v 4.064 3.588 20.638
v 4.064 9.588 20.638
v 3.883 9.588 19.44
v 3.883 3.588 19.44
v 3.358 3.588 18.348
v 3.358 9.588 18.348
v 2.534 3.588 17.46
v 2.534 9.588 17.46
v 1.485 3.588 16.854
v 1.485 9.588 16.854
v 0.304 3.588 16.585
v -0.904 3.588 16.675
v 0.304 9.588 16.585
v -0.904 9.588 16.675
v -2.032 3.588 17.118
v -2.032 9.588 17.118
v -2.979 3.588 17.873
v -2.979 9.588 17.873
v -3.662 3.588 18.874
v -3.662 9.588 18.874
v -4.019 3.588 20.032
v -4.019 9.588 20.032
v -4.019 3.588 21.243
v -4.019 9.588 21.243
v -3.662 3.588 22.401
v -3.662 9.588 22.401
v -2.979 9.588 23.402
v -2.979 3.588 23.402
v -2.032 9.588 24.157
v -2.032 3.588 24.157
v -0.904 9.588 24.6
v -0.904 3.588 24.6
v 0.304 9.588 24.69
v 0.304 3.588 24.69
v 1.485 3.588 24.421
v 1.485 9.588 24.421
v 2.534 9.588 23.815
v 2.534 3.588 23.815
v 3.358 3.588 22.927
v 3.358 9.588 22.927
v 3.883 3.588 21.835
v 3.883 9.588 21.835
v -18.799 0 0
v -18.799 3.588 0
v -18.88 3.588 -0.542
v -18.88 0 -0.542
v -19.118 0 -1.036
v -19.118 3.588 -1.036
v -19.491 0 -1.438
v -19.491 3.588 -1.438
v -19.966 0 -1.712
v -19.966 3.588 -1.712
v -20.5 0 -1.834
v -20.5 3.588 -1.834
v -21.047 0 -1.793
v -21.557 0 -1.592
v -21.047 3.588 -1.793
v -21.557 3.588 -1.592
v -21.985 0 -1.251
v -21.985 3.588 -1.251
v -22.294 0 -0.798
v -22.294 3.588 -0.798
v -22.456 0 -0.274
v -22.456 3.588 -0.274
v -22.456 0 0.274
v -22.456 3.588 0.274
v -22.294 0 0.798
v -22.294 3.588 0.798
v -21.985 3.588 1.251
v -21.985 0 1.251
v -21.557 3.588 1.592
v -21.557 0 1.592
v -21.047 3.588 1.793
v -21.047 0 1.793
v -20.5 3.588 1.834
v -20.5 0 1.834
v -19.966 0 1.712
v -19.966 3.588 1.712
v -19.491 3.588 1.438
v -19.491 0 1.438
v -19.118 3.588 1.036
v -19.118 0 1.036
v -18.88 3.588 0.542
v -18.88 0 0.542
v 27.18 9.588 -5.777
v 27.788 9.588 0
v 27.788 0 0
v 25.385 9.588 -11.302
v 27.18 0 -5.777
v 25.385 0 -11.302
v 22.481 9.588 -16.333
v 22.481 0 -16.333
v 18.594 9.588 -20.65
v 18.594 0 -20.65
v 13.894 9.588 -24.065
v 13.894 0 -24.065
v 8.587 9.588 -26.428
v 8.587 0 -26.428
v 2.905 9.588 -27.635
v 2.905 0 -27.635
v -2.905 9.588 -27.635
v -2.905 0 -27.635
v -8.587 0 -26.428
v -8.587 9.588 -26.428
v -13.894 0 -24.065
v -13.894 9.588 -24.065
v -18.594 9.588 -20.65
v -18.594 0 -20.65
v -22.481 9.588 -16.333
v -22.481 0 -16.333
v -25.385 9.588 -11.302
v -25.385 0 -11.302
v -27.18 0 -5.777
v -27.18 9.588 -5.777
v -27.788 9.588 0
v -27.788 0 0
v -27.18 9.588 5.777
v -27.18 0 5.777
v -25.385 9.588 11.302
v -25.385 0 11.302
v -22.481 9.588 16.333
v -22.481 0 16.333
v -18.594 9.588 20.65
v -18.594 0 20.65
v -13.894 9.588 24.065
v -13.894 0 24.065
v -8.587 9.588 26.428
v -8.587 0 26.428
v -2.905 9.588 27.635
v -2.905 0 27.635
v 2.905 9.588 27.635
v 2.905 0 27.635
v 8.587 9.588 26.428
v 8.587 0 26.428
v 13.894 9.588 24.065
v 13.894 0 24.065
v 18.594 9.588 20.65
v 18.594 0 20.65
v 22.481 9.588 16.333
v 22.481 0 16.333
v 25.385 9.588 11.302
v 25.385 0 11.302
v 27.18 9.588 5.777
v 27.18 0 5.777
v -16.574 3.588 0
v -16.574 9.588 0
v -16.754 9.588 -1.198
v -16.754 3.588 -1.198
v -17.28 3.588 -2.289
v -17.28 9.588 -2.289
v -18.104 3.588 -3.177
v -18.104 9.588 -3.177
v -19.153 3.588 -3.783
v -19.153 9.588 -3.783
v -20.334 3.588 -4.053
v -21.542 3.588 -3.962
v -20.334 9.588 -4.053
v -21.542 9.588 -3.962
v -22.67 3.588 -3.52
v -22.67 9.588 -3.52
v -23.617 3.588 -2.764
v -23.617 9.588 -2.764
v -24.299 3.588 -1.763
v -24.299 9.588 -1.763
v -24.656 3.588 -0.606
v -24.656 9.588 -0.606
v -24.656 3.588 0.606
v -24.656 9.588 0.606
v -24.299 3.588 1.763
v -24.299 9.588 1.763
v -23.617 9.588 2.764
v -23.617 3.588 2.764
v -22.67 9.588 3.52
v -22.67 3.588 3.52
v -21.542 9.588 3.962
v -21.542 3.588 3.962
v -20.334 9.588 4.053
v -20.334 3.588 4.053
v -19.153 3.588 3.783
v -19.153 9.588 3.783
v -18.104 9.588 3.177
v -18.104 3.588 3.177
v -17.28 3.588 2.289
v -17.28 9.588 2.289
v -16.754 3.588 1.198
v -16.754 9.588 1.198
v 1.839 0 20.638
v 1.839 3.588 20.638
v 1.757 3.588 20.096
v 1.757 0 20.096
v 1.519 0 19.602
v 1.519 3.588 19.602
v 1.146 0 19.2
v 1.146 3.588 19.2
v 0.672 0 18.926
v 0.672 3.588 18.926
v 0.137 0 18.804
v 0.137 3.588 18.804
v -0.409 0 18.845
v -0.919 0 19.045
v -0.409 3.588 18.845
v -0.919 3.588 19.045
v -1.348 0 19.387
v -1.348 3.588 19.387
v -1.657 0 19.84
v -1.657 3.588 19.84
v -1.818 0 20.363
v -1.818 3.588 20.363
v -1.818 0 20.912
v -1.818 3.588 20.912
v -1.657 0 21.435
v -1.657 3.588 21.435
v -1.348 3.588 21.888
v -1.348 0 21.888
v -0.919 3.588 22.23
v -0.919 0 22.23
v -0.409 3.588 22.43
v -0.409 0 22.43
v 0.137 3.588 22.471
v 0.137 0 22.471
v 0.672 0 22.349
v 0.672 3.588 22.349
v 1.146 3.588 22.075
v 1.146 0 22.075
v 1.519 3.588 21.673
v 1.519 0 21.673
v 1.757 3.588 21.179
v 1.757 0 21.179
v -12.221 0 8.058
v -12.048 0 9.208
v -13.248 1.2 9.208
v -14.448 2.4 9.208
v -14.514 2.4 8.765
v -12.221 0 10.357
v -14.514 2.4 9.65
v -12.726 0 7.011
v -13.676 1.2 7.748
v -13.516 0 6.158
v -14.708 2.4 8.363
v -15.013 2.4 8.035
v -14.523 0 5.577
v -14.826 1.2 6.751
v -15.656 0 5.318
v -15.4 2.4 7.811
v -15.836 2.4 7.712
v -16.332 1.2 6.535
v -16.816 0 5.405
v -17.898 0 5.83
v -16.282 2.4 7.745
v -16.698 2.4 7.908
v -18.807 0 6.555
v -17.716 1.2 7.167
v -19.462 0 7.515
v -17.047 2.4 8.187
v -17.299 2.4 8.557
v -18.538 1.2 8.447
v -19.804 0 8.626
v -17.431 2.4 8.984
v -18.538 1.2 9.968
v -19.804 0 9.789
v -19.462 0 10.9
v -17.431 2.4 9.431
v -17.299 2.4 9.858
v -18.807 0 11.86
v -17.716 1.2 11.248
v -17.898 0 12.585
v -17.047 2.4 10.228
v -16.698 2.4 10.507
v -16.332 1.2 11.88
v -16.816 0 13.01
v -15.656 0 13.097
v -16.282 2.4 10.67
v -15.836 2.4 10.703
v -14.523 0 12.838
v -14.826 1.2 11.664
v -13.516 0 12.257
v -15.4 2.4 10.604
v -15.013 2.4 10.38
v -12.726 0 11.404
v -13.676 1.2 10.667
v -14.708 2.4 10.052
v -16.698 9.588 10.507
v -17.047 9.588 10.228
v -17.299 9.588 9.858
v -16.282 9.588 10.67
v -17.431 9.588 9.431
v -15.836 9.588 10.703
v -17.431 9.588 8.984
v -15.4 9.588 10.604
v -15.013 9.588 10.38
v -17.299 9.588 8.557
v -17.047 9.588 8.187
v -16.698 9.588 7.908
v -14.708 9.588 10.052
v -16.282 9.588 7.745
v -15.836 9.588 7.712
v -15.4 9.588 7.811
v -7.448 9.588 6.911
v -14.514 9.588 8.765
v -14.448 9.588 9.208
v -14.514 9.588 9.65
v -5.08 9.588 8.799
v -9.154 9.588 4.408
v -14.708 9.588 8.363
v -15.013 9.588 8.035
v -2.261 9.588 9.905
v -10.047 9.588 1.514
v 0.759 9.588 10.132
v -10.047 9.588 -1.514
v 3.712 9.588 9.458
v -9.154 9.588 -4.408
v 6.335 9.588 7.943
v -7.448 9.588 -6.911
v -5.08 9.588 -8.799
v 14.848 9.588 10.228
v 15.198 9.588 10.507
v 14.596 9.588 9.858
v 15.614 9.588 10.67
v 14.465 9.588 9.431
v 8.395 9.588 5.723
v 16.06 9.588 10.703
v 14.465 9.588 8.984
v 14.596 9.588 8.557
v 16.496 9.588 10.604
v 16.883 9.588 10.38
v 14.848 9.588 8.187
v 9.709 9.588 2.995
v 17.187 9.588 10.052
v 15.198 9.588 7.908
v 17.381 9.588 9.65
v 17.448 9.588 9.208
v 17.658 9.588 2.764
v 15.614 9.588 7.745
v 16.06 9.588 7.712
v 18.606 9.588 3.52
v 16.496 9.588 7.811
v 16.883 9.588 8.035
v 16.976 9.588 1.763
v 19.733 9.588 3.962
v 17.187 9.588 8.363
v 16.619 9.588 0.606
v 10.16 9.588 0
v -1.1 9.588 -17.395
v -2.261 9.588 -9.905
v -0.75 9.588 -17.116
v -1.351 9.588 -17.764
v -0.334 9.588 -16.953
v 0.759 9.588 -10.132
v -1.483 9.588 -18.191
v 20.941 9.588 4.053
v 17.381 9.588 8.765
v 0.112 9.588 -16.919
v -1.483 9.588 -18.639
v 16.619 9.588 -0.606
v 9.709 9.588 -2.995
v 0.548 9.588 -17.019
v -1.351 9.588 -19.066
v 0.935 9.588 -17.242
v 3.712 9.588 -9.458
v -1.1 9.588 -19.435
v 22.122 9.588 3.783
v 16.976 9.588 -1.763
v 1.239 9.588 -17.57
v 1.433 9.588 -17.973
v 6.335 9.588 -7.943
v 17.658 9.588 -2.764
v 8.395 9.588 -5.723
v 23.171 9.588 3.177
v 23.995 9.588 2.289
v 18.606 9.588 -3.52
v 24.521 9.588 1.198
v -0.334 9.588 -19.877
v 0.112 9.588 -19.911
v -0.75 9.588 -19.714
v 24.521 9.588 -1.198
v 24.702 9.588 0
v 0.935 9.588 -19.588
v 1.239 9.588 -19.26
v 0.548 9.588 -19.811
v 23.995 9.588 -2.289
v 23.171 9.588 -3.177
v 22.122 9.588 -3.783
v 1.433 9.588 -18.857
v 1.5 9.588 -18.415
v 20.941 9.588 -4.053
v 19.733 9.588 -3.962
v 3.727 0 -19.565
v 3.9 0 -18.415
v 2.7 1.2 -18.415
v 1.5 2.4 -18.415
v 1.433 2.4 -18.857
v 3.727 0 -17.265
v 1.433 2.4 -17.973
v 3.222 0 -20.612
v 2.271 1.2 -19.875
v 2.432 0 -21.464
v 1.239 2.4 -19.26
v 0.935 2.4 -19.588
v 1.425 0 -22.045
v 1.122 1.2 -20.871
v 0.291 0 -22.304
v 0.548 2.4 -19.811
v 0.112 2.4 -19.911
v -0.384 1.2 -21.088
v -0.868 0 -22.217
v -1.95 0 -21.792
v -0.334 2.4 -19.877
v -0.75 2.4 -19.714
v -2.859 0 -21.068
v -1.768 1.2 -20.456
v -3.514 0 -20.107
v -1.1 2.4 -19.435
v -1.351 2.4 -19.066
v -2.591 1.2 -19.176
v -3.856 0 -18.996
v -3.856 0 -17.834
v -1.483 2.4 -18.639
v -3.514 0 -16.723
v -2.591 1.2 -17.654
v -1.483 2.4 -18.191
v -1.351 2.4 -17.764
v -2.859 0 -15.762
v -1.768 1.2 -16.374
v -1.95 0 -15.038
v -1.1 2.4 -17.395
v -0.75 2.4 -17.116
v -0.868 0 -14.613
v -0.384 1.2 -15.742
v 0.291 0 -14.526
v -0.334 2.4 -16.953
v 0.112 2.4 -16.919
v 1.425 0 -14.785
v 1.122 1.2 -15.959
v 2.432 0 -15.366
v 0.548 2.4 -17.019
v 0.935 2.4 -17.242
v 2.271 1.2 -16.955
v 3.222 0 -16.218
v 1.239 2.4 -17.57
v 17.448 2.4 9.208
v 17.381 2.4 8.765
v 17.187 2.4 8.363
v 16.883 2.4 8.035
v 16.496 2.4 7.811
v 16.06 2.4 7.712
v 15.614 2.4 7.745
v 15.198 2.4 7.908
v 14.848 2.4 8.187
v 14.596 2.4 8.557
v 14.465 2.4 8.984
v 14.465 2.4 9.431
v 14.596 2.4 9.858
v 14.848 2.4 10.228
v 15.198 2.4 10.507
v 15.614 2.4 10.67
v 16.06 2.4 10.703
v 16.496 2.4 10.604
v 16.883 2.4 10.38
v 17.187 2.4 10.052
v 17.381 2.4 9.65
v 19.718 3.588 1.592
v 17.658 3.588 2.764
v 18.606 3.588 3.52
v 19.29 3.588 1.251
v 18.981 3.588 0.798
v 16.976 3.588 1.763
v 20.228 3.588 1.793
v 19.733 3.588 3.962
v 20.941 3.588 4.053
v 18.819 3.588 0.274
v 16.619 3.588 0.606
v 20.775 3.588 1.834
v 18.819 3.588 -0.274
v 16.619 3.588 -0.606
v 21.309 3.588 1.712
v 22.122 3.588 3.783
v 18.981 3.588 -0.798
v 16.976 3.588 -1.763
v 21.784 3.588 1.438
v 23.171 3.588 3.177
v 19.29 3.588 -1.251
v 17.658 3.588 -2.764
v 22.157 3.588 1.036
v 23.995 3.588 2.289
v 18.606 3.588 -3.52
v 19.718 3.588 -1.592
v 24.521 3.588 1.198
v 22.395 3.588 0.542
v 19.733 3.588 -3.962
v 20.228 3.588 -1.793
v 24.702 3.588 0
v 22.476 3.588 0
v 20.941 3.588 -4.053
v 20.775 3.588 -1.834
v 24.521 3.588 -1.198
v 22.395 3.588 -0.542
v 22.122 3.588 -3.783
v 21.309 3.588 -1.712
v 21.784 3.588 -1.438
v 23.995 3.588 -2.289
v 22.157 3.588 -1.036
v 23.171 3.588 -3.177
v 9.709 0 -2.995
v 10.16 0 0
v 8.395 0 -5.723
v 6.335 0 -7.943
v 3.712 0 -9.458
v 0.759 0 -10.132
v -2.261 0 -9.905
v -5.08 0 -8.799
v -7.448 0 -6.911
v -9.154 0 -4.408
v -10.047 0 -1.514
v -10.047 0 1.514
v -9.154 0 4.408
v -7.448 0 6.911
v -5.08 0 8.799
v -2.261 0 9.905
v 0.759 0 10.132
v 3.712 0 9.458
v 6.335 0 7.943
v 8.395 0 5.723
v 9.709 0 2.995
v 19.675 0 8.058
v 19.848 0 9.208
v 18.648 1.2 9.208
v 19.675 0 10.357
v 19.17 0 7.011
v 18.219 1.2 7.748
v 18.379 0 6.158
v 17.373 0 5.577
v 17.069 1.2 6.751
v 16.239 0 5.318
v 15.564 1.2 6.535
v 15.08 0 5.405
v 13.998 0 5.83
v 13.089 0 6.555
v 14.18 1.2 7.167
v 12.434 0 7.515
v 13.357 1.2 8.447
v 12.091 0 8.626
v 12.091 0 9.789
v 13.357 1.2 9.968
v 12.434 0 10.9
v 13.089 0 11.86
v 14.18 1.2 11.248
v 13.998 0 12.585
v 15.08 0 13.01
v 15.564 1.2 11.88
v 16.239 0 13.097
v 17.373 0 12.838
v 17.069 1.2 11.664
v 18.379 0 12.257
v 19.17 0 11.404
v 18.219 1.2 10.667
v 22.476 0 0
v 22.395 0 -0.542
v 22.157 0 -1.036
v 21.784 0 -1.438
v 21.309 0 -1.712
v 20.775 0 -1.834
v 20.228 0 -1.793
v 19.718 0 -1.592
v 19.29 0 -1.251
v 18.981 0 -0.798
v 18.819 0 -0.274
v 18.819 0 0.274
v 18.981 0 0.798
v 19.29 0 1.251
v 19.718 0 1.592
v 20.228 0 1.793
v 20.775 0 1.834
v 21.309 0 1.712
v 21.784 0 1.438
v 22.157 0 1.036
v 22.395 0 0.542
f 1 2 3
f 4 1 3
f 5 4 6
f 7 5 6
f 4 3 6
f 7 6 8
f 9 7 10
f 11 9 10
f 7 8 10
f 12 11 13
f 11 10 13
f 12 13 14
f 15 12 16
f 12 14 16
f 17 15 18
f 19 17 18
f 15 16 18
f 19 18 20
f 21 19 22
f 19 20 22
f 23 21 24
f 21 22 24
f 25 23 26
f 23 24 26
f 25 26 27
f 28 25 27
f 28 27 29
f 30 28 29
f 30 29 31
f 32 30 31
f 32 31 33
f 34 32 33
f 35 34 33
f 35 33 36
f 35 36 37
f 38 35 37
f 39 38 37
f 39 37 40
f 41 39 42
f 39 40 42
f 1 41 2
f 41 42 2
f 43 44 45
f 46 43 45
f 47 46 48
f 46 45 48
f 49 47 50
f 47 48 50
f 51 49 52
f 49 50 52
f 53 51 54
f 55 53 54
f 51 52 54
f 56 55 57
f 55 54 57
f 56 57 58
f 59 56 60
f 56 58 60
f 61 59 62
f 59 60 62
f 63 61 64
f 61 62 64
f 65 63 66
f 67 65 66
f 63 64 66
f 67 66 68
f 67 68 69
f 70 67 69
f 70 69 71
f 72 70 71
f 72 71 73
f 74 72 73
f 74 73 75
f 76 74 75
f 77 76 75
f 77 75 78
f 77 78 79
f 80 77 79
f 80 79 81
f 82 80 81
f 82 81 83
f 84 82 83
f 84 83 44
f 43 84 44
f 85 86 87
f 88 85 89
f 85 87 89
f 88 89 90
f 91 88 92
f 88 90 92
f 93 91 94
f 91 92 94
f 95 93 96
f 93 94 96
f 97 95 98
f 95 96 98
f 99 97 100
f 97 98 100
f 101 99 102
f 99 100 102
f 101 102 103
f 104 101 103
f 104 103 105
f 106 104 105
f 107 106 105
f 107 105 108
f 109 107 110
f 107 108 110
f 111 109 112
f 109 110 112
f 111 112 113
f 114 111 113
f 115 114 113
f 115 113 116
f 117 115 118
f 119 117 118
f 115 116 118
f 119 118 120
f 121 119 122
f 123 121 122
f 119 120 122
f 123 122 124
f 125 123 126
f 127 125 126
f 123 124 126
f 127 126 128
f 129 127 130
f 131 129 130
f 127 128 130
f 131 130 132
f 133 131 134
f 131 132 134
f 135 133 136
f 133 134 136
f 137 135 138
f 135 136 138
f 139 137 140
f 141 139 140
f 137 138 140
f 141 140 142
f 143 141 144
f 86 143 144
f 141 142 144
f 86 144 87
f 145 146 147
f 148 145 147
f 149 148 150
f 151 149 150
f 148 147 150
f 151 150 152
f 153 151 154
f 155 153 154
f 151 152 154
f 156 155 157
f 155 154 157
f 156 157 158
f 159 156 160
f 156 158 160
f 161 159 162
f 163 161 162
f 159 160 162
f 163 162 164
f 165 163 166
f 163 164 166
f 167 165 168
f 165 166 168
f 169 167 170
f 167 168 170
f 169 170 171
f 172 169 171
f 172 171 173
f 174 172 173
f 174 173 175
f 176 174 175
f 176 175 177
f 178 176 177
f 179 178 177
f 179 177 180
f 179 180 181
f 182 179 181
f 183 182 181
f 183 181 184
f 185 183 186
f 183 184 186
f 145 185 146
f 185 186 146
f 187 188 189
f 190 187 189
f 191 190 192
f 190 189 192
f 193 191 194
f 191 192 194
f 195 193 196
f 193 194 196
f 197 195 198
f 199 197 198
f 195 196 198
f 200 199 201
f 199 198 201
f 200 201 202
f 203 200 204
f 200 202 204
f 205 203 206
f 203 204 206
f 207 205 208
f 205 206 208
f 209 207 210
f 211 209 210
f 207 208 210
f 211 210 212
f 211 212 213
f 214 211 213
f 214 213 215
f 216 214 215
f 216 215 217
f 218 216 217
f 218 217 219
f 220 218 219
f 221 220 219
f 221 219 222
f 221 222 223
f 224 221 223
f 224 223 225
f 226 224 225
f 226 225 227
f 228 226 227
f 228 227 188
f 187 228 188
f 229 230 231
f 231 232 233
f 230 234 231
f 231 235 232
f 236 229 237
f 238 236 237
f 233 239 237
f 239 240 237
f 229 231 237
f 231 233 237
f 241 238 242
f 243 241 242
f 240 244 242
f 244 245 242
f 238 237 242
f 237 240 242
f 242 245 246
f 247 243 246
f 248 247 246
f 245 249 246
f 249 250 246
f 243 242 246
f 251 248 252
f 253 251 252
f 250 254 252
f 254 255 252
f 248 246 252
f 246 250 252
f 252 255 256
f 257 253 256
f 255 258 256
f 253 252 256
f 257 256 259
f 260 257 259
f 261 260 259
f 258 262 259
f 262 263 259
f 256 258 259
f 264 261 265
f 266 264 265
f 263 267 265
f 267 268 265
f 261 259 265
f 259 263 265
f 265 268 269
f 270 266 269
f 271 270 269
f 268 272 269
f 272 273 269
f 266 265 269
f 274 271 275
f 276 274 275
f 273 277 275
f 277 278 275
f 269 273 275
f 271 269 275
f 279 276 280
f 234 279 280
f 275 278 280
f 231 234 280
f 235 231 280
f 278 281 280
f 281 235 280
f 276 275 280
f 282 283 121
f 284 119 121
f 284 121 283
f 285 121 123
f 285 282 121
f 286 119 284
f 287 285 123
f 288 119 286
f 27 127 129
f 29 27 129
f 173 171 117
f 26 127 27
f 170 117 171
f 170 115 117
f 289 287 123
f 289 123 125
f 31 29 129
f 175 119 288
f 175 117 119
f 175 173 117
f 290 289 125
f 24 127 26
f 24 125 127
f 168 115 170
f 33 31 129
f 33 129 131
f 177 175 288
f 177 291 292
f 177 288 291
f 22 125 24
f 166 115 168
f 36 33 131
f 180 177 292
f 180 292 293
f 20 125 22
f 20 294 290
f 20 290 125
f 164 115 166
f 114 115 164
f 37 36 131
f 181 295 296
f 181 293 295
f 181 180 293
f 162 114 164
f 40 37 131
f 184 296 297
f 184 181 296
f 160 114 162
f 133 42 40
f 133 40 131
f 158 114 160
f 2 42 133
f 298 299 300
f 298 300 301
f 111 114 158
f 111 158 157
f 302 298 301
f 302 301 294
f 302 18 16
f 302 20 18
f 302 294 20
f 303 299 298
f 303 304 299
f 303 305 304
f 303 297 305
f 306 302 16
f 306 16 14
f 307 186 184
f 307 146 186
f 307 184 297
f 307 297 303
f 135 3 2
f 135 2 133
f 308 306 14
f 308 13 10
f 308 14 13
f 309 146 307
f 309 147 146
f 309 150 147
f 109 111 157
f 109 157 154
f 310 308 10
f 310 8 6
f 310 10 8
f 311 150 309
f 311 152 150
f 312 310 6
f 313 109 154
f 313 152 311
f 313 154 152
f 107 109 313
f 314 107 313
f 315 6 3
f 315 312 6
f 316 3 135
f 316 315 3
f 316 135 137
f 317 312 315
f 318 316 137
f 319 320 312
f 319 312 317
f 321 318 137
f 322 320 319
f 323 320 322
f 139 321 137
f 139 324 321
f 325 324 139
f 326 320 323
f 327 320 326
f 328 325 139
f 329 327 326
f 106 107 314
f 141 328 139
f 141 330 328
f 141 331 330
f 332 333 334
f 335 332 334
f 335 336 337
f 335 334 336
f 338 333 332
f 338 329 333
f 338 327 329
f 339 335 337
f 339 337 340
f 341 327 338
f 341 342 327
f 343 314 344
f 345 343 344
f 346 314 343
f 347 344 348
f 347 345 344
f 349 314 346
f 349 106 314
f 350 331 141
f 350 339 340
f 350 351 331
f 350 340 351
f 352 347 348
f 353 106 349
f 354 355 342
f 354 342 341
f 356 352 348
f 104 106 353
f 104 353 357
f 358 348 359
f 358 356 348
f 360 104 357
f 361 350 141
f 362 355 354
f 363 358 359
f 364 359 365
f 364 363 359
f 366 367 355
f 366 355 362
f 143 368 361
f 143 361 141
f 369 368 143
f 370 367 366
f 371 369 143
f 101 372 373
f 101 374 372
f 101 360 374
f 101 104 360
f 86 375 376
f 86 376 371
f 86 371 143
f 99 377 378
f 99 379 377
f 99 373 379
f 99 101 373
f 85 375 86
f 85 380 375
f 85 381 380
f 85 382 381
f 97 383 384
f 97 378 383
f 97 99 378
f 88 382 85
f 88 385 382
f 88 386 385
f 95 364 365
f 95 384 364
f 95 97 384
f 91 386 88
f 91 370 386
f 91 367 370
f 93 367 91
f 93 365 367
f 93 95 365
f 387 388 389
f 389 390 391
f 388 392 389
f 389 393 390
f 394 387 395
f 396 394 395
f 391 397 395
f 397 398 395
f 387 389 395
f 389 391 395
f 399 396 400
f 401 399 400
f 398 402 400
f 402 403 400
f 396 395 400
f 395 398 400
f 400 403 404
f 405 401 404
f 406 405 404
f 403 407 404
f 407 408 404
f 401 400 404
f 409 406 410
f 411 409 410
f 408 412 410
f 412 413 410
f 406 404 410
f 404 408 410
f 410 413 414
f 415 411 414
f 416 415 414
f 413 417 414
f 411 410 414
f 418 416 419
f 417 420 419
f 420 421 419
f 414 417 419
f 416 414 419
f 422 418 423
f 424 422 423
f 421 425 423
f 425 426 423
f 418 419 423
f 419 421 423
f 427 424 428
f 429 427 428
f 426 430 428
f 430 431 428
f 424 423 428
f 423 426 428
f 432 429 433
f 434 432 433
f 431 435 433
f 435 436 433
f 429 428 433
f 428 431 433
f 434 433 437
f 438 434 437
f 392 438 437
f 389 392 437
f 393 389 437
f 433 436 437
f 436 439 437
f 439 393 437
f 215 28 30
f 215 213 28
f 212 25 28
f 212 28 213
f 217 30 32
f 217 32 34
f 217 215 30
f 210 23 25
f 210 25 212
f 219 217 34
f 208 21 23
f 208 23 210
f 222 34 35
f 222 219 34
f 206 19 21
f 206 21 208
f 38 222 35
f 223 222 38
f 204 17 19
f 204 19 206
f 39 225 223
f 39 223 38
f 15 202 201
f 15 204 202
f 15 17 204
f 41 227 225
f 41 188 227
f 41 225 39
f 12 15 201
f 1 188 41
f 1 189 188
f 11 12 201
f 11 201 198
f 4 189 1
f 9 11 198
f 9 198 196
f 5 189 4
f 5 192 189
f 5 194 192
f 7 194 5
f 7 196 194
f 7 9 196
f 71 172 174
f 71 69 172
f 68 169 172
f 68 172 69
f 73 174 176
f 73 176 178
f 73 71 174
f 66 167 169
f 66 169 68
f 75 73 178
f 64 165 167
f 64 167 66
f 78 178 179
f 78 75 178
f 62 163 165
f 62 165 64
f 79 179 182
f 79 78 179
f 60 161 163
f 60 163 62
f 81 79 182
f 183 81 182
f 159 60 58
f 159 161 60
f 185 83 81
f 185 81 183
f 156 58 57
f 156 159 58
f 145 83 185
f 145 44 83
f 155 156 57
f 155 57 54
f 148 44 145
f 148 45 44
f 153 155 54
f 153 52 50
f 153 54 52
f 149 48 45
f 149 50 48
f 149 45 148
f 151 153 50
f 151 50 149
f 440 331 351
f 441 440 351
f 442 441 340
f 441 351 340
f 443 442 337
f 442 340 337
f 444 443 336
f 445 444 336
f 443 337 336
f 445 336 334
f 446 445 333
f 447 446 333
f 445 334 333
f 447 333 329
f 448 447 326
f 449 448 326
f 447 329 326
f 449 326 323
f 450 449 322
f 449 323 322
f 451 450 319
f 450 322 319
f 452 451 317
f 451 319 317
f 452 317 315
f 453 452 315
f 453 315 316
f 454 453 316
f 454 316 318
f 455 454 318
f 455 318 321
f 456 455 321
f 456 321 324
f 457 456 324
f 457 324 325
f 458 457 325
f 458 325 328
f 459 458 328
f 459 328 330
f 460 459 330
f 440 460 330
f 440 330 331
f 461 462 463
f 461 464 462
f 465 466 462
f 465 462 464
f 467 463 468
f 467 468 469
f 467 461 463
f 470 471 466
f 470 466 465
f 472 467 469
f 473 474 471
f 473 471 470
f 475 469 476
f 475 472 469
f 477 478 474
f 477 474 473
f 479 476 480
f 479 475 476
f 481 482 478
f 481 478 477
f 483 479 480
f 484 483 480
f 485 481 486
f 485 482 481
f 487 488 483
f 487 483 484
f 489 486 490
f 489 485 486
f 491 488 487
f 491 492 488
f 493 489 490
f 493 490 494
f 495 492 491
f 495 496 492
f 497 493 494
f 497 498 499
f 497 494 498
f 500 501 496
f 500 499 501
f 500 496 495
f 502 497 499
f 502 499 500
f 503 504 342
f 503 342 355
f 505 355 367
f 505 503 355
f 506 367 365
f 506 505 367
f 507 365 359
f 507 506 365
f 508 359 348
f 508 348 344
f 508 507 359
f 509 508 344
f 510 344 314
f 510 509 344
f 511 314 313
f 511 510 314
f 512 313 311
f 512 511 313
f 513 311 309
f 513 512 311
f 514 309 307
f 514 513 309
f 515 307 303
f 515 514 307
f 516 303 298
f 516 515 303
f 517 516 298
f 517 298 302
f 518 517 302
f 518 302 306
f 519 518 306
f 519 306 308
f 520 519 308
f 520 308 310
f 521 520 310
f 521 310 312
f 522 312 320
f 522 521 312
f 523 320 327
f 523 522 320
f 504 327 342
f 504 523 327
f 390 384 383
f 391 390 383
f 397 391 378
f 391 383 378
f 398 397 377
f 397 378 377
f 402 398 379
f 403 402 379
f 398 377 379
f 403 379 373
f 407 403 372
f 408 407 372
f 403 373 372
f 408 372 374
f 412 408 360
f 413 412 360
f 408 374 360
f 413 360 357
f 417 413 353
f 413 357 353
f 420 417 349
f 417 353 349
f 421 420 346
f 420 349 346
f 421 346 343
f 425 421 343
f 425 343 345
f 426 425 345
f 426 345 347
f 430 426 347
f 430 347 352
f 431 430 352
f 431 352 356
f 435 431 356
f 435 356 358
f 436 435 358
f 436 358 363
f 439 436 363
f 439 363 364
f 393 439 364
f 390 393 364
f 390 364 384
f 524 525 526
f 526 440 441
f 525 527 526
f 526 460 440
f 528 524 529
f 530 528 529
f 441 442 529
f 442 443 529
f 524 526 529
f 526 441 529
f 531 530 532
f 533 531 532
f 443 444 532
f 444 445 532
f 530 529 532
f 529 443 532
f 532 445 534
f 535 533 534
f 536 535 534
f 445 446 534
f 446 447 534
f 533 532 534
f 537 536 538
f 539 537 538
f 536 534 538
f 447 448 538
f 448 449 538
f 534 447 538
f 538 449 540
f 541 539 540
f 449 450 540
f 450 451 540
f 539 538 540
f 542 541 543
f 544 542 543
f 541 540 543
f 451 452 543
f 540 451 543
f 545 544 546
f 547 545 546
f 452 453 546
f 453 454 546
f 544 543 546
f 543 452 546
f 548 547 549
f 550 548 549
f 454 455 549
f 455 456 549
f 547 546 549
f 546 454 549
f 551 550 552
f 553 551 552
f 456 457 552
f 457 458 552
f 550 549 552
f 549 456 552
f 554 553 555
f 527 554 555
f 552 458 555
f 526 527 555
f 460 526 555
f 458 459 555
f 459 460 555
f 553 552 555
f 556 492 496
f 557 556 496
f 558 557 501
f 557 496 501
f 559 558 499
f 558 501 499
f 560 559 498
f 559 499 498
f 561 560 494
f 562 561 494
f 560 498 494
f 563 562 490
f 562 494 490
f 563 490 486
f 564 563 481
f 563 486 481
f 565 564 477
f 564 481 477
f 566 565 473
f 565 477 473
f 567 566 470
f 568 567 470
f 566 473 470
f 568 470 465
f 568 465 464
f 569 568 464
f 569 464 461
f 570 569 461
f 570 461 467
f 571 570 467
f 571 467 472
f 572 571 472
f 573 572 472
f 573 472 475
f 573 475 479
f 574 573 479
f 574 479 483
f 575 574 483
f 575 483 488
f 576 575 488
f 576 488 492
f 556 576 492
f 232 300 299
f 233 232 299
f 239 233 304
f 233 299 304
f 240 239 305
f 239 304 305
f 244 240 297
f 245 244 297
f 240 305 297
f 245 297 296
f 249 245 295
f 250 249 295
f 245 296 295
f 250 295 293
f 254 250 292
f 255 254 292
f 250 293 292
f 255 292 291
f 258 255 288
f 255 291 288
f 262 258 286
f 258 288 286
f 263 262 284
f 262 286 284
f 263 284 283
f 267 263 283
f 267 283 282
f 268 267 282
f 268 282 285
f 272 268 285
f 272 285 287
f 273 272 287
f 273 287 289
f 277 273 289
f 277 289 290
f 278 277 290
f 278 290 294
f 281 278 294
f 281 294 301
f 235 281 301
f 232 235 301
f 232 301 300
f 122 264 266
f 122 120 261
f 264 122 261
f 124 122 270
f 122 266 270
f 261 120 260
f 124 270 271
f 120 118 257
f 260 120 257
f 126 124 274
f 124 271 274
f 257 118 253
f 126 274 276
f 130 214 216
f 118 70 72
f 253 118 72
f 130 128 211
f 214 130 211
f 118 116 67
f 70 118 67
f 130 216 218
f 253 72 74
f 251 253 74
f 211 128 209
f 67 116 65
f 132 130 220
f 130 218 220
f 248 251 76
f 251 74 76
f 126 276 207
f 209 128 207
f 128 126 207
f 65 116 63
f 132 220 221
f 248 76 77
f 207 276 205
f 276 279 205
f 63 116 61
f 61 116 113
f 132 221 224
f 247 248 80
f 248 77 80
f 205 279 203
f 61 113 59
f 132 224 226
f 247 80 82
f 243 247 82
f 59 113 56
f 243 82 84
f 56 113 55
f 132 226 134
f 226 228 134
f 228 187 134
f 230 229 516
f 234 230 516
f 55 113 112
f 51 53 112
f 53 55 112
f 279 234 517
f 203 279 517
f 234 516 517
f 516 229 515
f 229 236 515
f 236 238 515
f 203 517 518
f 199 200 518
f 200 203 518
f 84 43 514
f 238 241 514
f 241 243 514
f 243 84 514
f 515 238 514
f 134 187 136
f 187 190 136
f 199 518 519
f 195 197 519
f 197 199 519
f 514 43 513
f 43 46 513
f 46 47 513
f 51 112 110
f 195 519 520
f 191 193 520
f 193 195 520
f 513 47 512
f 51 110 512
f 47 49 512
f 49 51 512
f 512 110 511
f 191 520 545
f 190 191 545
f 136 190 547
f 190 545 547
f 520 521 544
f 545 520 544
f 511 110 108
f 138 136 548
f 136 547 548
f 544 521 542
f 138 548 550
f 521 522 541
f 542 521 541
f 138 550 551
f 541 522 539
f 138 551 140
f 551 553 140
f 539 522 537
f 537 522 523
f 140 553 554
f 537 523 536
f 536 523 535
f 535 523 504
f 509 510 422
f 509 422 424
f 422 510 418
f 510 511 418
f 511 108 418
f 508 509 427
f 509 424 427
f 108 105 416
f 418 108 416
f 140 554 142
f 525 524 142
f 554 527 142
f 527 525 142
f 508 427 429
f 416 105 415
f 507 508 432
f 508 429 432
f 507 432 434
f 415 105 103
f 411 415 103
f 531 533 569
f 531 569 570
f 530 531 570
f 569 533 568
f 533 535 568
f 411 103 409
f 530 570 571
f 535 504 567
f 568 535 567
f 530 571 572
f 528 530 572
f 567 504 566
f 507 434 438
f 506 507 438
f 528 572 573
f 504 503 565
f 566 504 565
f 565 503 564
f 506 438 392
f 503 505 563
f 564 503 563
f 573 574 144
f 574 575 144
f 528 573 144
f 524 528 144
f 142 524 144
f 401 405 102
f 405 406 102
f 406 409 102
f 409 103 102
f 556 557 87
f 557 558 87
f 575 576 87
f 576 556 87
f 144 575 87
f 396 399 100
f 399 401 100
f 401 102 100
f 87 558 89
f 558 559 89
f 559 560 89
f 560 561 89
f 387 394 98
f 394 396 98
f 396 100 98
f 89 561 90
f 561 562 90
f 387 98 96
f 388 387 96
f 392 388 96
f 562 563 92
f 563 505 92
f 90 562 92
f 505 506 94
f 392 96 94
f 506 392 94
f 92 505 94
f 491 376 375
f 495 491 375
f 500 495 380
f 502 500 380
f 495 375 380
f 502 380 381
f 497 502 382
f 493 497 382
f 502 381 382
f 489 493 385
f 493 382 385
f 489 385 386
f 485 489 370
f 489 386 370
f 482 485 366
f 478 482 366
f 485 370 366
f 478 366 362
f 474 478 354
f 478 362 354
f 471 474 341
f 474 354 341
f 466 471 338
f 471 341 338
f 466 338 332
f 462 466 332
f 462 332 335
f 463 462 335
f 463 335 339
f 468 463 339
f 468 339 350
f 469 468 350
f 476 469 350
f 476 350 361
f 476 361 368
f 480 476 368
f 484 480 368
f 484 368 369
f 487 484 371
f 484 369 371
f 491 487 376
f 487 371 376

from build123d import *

# Parameters (mm, degrees)
SKETCH1_R               = 27.7876
SKETCH1_R_2             = 10.16
RING_DEPTH              = 9.5885
SKETCH2_R               = 1.5
ROBOT_SIDE1_HOLES_DEPTH = 10.5885
ROBOT_SIDE_CHAMFER_SIZE = 2.4
SKETCH3_R               = 1.838724863
TOOL_SIDE_HOLES_DEPTH   = 10.5885
SKETCH4_R               = 4.064
TOOL_SIDE_INSET_DEPTH   = 6


with BuildPart() as part:
    # Sketch1 → Ring (new body)
    with BuildSketch(Plane(origin=(0, 0, 0), x_dir=(1, 0, 0), z_dir=(0, 1, 0))):
        Circle(SKETCH1_R)
        Circle(SKETCH1_R_2, mode=Mode.SUBTRACT)
    extrude(amount=RING_DEPTH)

    # Sketch2 → Robot Side1 - Holes (cut, through all)
    with BuildSketch(Plane(origin=(0, 9.5885, 0), x_dir=(1, 0, 0), z_dir=(0, 1, 0))):
        with Locations((0, 18.415)):
            Circle(SKETCH2_R)
        with Locations((15.947857811, -9.2075)):
            Circle(SKETCH2_R)
        with Locations((-15.947857811, -9.2075)):
            Circle(SKETCH2_R)
    extrude(amount=-ROBOT_SIDE1_HOLES_DEPTH, mode=Mode.SUBTRACT)

    # Robot Side - Chamfer
    robot_side_chamfer_edges = [part.edges().sort_by_distance(p)[0] for p in [
        (-1.5, 0, -18.415),
        (14.447857811, 0, 9.2075),
        (-17.447857811, 0, 9.2075),
    ]]
    chamfer(robot_side_chamfer_edges, length=ROBOT_SIDE_CHAMFER_SIZE)

    # Sketch3 → Tool Side - Holes (cut, through all)
    with BuildSketch(Plane(origin=(0, 9.5885, 0), x_dir=(1, 0, 0), z_dir=(0, 1, 0))):
        with Locations((20.6375, 0)):
            Circle(SKETCH3_R)
        with Locations((0, -20.6375)):
            Circle(SKETCH3_R)
        with Locations((-20.6375, 0)):
            Circle(SKETCH3_R)
    extrude(amount=-TOOL_SIDE_HOLES_DEPTH, mode=Mode.SUBTRACT)

    # Sketch4 → Tool Side - Inset (cut)
    with BuildSketch(Plane(origin=(0, 9.5885, 0), x_dir=(1, 0, 0), z_dir=(0, 1, 0))):
        with Locations((-20.6375, 0)):
            Circle(SKETCH4_R)
        with Locations((0, -20.6375)):
            Circle(SKETCH4_R)
        with Locations((20.6375, 0)):
            Circle(SKETCH4_R)
    extrude(amount=-TOOL_SIDE_INSET_DEPTH, mode=Mode.SUBTRACT)


solid = part.part
